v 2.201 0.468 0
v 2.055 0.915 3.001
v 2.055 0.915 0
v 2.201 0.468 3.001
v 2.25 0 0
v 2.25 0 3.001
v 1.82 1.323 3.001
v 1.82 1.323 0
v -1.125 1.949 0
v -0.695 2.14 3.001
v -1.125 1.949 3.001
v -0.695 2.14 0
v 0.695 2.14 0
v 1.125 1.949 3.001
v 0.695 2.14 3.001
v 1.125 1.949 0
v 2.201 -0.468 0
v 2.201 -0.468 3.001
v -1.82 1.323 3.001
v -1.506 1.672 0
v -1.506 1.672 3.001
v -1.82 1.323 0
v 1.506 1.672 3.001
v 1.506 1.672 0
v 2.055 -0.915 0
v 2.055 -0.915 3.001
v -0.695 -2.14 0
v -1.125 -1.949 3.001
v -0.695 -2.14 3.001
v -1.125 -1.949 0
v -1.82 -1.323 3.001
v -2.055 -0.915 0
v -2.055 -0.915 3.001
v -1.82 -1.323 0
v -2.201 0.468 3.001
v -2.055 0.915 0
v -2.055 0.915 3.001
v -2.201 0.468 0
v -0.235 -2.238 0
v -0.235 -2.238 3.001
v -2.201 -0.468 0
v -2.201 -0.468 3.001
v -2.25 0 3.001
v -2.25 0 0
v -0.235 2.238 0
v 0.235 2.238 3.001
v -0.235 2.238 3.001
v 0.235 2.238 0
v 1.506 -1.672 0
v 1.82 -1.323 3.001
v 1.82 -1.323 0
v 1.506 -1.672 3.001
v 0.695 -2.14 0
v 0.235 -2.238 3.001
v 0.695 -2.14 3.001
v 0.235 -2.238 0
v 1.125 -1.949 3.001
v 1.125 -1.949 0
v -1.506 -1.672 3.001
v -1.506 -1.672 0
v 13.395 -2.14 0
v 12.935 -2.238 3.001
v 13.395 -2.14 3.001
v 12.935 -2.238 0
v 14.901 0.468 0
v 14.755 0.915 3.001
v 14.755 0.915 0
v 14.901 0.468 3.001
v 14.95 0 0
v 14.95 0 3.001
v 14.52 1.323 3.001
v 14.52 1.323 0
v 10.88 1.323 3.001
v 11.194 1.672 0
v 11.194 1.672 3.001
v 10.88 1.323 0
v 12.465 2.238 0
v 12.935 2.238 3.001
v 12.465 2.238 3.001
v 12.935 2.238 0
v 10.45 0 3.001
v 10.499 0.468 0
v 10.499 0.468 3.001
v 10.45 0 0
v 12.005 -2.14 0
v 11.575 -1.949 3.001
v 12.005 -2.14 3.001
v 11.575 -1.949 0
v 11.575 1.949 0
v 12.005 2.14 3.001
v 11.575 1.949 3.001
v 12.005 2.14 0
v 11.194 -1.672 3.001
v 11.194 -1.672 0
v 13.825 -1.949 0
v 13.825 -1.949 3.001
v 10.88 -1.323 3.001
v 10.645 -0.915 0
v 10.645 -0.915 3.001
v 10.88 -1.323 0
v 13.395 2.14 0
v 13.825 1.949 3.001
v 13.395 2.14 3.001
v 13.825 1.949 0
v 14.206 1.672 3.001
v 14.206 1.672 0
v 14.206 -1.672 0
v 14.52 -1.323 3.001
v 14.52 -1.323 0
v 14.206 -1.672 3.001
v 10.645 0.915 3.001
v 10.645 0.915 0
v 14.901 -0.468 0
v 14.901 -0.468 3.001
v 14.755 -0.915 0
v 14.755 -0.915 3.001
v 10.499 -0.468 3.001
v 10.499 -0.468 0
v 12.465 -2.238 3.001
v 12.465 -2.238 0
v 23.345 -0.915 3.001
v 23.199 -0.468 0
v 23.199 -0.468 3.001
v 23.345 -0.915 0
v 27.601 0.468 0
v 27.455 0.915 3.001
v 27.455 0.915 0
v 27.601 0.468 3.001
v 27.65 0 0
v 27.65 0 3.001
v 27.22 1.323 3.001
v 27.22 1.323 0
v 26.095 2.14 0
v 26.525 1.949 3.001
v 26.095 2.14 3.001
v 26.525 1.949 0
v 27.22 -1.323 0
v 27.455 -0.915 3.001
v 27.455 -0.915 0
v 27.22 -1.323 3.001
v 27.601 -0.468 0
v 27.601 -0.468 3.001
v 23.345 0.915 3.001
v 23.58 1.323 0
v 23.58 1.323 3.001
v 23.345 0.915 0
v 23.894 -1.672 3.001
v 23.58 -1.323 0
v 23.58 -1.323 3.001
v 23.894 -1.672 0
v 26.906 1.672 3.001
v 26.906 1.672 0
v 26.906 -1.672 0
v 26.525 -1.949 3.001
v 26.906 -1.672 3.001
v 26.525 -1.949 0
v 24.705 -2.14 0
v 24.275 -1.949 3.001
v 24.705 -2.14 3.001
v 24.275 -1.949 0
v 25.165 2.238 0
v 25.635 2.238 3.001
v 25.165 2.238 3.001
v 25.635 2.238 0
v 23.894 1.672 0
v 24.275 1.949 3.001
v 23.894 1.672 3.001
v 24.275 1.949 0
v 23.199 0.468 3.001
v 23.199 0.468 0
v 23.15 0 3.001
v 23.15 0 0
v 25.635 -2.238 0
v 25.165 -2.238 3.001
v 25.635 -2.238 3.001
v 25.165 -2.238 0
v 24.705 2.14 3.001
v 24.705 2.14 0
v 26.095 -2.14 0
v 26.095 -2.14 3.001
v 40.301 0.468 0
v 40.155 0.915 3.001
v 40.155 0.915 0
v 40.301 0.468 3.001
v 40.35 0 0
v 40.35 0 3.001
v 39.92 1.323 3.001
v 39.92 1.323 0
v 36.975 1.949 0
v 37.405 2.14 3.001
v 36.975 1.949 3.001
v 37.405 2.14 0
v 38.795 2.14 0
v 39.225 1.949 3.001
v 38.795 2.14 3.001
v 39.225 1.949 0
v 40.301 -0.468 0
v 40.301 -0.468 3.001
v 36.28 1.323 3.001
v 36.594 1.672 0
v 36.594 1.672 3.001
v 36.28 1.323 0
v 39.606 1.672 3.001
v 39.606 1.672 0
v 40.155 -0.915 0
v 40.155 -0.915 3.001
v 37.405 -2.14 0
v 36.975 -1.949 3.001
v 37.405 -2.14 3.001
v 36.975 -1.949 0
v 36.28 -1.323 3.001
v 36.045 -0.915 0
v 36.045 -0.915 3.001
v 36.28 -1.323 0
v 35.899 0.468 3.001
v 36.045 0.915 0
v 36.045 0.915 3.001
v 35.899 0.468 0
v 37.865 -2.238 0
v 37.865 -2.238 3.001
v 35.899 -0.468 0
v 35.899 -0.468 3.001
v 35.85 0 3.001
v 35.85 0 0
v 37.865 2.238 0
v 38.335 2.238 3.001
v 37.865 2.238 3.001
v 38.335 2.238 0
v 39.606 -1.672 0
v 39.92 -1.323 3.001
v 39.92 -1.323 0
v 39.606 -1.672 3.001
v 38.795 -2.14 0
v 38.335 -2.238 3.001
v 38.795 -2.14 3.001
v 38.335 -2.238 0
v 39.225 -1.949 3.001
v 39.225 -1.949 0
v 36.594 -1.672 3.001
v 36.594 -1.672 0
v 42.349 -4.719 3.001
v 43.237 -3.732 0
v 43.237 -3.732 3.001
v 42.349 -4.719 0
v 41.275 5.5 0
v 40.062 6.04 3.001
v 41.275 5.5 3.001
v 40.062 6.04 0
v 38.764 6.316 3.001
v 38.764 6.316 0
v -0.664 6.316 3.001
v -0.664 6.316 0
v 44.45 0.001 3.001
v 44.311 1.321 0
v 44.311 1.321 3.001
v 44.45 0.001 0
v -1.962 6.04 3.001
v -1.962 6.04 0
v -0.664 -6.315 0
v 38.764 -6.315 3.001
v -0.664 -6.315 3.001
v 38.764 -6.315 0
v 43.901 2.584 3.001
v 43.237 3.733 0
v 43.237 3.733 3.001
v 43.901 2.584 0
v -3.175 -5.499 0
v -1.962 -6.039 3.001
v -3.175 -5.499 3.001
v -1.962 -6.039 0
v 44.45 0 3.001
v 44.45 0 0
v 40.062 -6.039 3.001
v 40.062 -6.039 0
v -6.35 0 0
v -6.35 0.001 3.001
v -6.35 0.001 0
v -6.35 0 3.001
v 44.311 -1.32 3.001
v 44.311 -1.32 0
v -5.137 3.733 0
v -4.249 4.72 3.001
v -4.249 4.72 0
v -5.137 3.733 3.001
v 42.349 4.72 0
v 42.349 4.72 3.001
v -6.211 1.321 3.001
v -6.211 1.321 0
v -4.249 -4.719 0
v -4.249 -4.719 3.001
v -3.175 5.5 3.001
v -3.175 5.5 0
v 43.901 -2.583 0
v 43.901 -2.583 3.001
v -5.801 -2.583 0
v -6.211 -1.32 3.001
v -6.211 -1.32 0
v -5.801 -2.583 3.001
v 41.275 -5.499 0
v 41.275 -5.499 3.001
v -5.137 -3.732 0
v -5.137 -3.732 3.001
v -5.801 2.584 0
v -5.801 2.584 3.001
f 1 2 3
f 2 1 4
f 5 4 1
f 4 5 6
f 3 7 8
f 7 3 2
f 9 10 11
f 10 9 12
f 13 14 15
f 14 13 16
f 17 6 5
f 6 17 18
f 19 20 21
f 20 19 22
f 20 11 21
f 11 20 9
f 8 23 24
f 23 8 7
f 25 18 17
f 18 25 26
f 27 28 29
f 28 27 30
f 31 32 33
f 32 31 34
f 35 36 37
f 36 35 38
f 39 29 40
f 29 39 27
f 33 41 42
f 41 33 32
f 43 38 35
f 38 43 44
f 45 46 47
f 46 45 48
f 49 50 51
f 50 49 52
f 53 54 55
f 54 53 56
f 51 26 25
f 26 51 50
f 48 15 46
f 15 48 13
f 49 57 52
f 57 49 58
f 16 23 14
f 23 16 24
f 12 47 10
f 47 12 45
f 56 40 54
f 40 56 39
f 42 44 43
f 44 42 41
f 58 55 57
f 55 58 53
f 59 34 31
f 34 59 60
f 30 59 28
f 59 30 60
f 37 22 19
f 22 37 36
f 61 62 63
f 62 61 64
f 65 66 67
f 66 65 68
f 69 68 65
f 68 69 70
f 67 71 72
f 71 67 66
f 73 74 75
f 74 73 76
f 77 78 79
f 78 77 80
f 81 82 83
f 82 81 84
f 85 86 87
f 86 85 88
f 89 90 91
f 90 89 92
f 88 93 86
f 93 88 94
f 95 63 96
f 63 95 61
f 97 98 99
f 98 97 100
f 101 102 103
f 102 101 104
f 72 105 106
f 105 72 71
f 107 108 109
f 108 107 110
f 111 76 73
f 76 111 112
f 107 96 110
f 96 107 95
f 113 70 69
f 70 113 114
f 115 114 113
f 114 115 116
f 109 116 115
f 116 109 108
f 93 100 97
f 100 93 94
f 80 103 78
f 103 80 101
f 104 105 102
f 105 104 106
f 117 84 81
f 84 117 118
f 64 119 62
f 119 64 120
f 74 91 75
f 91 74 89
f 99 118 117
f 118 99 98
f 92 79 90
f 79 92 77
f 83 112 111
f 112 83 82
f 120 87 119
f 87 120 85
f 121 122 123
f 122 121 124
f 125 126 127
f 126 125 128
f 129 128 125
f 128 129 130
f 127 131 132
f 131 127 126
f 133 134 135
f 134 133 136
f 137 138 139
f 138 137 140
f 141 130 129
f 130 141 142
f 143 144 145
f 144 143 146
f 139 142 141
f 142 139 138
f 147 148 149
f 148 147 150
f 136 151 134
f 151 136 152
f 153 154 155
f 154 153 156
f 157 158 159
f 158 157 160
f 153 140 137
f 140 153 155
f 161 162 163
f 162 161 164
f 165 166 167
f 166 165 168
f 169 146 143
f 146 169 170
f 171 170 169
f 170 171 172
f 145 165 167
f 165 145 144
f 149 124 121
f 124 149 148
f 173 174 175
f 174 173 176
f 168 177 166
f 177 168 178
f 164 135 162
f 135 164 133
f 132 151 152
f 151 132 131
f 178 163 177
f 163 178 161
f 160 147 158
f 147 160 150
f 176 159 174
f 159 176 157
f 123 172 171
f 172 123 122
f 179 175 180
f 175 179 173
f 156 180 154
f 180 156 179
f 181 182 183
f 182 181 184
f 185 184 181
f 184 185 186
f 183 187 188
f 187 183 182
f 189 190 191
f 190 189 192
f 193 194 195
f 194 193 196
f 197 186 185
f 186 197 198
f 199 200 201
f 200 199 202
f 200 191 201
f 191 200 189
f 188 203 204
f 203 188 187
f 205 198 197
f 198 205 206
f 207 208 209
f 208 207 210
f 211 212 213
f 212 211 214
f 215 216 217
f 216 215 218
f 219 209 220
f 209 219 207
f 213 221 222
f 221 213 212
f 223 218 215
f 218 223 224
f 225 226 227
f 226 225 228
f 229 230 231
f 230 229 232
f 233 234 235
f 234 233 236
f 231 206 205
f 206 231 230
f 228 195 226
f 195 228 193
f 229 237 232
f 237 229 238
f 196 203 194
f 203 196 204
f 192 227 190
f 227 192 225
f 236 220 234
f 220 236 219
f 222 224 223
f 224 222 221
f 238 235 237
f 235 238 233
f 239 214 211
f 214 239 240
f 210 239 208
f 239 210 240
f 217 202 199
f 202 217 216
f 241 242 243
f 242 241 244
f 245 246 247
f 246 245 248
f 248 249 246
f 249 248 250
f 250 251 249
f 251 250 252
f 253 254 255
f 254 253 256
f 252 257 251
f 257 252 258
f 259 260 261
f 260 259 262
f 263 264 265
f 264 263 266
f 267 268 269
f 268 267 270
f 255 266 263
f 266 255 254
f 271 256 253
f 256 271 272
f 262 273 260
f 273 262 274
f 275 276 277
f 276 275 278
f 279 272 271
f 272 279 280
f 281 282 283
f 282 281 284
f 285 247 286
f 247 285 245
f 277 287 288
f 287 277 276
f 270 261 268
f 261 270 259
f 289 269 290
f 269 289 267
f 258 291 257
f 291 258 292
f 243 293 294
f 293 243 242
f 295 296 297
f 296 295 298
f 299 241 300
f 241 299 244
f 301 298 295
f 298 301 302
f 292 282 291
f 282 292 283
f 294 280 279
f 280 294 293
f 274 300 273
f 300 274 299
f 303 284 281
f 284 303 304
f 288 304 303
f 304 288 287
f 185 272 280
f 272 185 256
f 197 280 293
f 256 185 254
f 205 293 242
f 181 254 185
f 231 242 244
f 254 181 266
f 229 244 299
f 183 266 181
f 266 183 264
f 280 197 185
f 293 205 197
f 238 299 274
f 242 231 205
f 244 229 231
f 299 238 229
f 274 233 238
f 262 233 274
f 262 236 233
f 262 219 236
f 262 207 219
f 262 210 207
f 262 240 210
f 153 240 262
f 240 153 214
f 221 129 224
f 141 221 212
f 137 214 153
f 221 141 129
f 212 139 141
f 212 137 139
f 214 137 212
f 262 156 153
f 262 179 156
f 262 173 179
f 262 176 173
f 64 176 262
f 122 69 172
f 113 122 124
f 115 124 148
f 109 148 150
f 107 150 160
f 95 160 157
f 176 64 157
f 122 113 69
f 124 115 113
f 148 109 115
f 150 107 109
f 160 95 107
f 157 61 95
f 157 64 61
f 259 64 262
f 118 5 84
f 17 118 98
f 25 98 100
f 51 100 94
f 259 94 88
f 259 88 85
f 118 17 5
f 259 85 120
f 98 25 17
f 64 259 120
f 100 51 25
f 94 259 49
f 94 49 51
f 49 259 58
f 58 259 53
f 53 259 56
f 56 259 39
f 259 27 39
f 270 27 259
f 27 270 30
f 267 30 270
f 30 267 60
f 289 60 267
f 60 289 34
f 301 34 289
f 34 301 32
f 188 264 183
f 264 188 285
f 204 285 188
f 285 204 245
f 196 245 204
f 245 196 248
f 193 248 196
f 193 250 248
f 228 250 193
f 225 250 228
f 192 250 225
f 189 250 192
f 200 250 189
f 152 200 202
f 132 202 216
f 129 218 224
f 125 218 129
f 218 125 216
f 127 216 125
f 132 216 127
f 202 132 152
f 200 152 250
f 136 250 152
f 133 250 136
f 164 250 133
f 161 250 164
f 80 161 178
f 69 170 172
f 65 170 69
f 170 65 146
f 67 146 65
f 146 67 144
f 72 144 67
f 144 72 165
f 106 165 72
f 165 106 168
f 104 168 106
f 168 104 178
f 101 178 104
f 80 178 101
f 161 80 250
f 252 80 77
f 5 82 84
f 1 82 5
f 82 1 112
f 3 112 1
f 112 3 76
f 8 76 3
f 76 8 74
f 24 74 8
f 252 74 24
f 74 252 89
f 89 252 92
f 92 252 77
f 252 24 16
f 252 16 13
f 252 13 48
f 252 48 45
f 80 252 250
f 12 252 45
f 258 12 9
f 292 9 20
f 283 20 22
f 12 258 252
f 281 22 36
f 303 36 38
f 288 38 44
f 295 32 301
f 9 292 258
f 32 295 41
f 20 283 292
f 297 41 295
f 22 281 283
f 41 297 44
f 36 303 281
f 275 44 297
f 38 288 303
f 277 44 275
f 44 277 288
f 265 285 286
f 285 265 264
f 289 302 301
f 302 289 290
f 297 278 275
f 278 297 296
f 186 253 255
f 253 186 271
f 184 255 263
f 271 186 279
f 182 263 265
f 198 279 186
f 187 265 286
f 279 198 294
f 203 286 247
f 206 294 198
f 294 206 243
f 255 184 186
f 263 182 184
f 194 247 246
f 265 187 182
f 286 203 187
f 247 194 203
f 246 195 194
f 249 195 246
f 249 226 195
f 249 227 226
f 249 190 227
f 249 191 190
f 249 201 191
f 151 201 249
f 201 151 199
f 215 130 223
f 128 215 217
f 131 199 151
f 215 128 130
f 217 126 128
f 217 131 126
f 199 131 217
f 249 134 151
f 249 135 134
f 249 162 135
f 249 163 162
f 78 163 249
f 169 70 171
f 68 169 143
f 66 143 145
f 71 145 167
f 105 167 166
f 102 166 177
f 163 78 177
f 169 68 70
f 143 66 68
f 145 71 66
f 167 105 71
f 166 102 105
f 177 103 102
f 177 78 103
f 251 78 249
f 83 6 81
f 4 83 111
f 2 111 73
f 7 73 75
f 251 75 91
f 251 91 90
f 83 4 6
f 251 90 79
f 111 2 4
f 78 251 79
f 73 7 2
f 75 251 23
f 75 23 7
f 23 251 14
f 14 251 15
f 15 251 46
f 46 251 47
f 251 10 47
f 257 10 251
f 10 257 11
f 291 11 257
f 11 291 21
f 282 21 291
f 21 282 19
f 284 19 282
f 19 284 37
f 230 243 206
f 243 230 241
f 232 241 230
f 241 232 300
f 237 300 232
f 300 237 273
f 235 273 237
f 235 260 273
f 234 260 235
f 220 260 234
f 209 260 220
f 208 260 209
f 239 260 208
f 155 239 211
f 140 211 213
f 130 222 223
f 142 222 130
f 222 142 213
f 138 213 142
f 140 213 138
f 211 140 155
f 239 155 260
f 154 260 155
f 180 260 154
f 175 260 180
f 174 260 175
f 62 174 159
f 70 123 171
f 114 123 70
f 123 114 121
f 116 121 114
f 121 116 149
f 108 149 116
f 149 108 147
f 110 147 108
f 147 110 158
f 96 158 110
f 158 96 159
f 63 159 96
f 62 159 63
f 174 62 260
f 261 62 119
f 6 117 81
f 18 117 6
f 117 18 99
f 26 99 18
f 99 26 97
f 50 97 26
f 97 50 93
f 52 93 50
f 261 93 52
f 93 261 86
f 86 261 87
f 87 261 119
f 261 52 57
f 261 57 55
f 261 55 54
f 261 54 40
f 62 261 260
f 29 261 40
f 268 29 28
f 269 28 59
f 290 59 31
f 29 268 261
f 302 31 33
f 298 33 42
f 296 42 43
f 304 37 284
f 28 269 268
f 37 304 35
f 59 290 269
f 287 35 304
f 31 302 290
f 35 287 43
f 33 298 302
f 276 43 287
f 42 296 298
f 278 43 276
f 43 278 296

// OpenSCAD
$fn=30;
meccano(n=4);

module meccano(n=2){
difference(){
    minkowski(){
        cylinder(d=12.7,h=3);
        cube([(n-1)*12.7,.001,0.001]);
    }
    for (i=[0:n-1]){
        translate([i*12.7,0,-1])cylinder(d=4.5,h=5);
    }
}
}
